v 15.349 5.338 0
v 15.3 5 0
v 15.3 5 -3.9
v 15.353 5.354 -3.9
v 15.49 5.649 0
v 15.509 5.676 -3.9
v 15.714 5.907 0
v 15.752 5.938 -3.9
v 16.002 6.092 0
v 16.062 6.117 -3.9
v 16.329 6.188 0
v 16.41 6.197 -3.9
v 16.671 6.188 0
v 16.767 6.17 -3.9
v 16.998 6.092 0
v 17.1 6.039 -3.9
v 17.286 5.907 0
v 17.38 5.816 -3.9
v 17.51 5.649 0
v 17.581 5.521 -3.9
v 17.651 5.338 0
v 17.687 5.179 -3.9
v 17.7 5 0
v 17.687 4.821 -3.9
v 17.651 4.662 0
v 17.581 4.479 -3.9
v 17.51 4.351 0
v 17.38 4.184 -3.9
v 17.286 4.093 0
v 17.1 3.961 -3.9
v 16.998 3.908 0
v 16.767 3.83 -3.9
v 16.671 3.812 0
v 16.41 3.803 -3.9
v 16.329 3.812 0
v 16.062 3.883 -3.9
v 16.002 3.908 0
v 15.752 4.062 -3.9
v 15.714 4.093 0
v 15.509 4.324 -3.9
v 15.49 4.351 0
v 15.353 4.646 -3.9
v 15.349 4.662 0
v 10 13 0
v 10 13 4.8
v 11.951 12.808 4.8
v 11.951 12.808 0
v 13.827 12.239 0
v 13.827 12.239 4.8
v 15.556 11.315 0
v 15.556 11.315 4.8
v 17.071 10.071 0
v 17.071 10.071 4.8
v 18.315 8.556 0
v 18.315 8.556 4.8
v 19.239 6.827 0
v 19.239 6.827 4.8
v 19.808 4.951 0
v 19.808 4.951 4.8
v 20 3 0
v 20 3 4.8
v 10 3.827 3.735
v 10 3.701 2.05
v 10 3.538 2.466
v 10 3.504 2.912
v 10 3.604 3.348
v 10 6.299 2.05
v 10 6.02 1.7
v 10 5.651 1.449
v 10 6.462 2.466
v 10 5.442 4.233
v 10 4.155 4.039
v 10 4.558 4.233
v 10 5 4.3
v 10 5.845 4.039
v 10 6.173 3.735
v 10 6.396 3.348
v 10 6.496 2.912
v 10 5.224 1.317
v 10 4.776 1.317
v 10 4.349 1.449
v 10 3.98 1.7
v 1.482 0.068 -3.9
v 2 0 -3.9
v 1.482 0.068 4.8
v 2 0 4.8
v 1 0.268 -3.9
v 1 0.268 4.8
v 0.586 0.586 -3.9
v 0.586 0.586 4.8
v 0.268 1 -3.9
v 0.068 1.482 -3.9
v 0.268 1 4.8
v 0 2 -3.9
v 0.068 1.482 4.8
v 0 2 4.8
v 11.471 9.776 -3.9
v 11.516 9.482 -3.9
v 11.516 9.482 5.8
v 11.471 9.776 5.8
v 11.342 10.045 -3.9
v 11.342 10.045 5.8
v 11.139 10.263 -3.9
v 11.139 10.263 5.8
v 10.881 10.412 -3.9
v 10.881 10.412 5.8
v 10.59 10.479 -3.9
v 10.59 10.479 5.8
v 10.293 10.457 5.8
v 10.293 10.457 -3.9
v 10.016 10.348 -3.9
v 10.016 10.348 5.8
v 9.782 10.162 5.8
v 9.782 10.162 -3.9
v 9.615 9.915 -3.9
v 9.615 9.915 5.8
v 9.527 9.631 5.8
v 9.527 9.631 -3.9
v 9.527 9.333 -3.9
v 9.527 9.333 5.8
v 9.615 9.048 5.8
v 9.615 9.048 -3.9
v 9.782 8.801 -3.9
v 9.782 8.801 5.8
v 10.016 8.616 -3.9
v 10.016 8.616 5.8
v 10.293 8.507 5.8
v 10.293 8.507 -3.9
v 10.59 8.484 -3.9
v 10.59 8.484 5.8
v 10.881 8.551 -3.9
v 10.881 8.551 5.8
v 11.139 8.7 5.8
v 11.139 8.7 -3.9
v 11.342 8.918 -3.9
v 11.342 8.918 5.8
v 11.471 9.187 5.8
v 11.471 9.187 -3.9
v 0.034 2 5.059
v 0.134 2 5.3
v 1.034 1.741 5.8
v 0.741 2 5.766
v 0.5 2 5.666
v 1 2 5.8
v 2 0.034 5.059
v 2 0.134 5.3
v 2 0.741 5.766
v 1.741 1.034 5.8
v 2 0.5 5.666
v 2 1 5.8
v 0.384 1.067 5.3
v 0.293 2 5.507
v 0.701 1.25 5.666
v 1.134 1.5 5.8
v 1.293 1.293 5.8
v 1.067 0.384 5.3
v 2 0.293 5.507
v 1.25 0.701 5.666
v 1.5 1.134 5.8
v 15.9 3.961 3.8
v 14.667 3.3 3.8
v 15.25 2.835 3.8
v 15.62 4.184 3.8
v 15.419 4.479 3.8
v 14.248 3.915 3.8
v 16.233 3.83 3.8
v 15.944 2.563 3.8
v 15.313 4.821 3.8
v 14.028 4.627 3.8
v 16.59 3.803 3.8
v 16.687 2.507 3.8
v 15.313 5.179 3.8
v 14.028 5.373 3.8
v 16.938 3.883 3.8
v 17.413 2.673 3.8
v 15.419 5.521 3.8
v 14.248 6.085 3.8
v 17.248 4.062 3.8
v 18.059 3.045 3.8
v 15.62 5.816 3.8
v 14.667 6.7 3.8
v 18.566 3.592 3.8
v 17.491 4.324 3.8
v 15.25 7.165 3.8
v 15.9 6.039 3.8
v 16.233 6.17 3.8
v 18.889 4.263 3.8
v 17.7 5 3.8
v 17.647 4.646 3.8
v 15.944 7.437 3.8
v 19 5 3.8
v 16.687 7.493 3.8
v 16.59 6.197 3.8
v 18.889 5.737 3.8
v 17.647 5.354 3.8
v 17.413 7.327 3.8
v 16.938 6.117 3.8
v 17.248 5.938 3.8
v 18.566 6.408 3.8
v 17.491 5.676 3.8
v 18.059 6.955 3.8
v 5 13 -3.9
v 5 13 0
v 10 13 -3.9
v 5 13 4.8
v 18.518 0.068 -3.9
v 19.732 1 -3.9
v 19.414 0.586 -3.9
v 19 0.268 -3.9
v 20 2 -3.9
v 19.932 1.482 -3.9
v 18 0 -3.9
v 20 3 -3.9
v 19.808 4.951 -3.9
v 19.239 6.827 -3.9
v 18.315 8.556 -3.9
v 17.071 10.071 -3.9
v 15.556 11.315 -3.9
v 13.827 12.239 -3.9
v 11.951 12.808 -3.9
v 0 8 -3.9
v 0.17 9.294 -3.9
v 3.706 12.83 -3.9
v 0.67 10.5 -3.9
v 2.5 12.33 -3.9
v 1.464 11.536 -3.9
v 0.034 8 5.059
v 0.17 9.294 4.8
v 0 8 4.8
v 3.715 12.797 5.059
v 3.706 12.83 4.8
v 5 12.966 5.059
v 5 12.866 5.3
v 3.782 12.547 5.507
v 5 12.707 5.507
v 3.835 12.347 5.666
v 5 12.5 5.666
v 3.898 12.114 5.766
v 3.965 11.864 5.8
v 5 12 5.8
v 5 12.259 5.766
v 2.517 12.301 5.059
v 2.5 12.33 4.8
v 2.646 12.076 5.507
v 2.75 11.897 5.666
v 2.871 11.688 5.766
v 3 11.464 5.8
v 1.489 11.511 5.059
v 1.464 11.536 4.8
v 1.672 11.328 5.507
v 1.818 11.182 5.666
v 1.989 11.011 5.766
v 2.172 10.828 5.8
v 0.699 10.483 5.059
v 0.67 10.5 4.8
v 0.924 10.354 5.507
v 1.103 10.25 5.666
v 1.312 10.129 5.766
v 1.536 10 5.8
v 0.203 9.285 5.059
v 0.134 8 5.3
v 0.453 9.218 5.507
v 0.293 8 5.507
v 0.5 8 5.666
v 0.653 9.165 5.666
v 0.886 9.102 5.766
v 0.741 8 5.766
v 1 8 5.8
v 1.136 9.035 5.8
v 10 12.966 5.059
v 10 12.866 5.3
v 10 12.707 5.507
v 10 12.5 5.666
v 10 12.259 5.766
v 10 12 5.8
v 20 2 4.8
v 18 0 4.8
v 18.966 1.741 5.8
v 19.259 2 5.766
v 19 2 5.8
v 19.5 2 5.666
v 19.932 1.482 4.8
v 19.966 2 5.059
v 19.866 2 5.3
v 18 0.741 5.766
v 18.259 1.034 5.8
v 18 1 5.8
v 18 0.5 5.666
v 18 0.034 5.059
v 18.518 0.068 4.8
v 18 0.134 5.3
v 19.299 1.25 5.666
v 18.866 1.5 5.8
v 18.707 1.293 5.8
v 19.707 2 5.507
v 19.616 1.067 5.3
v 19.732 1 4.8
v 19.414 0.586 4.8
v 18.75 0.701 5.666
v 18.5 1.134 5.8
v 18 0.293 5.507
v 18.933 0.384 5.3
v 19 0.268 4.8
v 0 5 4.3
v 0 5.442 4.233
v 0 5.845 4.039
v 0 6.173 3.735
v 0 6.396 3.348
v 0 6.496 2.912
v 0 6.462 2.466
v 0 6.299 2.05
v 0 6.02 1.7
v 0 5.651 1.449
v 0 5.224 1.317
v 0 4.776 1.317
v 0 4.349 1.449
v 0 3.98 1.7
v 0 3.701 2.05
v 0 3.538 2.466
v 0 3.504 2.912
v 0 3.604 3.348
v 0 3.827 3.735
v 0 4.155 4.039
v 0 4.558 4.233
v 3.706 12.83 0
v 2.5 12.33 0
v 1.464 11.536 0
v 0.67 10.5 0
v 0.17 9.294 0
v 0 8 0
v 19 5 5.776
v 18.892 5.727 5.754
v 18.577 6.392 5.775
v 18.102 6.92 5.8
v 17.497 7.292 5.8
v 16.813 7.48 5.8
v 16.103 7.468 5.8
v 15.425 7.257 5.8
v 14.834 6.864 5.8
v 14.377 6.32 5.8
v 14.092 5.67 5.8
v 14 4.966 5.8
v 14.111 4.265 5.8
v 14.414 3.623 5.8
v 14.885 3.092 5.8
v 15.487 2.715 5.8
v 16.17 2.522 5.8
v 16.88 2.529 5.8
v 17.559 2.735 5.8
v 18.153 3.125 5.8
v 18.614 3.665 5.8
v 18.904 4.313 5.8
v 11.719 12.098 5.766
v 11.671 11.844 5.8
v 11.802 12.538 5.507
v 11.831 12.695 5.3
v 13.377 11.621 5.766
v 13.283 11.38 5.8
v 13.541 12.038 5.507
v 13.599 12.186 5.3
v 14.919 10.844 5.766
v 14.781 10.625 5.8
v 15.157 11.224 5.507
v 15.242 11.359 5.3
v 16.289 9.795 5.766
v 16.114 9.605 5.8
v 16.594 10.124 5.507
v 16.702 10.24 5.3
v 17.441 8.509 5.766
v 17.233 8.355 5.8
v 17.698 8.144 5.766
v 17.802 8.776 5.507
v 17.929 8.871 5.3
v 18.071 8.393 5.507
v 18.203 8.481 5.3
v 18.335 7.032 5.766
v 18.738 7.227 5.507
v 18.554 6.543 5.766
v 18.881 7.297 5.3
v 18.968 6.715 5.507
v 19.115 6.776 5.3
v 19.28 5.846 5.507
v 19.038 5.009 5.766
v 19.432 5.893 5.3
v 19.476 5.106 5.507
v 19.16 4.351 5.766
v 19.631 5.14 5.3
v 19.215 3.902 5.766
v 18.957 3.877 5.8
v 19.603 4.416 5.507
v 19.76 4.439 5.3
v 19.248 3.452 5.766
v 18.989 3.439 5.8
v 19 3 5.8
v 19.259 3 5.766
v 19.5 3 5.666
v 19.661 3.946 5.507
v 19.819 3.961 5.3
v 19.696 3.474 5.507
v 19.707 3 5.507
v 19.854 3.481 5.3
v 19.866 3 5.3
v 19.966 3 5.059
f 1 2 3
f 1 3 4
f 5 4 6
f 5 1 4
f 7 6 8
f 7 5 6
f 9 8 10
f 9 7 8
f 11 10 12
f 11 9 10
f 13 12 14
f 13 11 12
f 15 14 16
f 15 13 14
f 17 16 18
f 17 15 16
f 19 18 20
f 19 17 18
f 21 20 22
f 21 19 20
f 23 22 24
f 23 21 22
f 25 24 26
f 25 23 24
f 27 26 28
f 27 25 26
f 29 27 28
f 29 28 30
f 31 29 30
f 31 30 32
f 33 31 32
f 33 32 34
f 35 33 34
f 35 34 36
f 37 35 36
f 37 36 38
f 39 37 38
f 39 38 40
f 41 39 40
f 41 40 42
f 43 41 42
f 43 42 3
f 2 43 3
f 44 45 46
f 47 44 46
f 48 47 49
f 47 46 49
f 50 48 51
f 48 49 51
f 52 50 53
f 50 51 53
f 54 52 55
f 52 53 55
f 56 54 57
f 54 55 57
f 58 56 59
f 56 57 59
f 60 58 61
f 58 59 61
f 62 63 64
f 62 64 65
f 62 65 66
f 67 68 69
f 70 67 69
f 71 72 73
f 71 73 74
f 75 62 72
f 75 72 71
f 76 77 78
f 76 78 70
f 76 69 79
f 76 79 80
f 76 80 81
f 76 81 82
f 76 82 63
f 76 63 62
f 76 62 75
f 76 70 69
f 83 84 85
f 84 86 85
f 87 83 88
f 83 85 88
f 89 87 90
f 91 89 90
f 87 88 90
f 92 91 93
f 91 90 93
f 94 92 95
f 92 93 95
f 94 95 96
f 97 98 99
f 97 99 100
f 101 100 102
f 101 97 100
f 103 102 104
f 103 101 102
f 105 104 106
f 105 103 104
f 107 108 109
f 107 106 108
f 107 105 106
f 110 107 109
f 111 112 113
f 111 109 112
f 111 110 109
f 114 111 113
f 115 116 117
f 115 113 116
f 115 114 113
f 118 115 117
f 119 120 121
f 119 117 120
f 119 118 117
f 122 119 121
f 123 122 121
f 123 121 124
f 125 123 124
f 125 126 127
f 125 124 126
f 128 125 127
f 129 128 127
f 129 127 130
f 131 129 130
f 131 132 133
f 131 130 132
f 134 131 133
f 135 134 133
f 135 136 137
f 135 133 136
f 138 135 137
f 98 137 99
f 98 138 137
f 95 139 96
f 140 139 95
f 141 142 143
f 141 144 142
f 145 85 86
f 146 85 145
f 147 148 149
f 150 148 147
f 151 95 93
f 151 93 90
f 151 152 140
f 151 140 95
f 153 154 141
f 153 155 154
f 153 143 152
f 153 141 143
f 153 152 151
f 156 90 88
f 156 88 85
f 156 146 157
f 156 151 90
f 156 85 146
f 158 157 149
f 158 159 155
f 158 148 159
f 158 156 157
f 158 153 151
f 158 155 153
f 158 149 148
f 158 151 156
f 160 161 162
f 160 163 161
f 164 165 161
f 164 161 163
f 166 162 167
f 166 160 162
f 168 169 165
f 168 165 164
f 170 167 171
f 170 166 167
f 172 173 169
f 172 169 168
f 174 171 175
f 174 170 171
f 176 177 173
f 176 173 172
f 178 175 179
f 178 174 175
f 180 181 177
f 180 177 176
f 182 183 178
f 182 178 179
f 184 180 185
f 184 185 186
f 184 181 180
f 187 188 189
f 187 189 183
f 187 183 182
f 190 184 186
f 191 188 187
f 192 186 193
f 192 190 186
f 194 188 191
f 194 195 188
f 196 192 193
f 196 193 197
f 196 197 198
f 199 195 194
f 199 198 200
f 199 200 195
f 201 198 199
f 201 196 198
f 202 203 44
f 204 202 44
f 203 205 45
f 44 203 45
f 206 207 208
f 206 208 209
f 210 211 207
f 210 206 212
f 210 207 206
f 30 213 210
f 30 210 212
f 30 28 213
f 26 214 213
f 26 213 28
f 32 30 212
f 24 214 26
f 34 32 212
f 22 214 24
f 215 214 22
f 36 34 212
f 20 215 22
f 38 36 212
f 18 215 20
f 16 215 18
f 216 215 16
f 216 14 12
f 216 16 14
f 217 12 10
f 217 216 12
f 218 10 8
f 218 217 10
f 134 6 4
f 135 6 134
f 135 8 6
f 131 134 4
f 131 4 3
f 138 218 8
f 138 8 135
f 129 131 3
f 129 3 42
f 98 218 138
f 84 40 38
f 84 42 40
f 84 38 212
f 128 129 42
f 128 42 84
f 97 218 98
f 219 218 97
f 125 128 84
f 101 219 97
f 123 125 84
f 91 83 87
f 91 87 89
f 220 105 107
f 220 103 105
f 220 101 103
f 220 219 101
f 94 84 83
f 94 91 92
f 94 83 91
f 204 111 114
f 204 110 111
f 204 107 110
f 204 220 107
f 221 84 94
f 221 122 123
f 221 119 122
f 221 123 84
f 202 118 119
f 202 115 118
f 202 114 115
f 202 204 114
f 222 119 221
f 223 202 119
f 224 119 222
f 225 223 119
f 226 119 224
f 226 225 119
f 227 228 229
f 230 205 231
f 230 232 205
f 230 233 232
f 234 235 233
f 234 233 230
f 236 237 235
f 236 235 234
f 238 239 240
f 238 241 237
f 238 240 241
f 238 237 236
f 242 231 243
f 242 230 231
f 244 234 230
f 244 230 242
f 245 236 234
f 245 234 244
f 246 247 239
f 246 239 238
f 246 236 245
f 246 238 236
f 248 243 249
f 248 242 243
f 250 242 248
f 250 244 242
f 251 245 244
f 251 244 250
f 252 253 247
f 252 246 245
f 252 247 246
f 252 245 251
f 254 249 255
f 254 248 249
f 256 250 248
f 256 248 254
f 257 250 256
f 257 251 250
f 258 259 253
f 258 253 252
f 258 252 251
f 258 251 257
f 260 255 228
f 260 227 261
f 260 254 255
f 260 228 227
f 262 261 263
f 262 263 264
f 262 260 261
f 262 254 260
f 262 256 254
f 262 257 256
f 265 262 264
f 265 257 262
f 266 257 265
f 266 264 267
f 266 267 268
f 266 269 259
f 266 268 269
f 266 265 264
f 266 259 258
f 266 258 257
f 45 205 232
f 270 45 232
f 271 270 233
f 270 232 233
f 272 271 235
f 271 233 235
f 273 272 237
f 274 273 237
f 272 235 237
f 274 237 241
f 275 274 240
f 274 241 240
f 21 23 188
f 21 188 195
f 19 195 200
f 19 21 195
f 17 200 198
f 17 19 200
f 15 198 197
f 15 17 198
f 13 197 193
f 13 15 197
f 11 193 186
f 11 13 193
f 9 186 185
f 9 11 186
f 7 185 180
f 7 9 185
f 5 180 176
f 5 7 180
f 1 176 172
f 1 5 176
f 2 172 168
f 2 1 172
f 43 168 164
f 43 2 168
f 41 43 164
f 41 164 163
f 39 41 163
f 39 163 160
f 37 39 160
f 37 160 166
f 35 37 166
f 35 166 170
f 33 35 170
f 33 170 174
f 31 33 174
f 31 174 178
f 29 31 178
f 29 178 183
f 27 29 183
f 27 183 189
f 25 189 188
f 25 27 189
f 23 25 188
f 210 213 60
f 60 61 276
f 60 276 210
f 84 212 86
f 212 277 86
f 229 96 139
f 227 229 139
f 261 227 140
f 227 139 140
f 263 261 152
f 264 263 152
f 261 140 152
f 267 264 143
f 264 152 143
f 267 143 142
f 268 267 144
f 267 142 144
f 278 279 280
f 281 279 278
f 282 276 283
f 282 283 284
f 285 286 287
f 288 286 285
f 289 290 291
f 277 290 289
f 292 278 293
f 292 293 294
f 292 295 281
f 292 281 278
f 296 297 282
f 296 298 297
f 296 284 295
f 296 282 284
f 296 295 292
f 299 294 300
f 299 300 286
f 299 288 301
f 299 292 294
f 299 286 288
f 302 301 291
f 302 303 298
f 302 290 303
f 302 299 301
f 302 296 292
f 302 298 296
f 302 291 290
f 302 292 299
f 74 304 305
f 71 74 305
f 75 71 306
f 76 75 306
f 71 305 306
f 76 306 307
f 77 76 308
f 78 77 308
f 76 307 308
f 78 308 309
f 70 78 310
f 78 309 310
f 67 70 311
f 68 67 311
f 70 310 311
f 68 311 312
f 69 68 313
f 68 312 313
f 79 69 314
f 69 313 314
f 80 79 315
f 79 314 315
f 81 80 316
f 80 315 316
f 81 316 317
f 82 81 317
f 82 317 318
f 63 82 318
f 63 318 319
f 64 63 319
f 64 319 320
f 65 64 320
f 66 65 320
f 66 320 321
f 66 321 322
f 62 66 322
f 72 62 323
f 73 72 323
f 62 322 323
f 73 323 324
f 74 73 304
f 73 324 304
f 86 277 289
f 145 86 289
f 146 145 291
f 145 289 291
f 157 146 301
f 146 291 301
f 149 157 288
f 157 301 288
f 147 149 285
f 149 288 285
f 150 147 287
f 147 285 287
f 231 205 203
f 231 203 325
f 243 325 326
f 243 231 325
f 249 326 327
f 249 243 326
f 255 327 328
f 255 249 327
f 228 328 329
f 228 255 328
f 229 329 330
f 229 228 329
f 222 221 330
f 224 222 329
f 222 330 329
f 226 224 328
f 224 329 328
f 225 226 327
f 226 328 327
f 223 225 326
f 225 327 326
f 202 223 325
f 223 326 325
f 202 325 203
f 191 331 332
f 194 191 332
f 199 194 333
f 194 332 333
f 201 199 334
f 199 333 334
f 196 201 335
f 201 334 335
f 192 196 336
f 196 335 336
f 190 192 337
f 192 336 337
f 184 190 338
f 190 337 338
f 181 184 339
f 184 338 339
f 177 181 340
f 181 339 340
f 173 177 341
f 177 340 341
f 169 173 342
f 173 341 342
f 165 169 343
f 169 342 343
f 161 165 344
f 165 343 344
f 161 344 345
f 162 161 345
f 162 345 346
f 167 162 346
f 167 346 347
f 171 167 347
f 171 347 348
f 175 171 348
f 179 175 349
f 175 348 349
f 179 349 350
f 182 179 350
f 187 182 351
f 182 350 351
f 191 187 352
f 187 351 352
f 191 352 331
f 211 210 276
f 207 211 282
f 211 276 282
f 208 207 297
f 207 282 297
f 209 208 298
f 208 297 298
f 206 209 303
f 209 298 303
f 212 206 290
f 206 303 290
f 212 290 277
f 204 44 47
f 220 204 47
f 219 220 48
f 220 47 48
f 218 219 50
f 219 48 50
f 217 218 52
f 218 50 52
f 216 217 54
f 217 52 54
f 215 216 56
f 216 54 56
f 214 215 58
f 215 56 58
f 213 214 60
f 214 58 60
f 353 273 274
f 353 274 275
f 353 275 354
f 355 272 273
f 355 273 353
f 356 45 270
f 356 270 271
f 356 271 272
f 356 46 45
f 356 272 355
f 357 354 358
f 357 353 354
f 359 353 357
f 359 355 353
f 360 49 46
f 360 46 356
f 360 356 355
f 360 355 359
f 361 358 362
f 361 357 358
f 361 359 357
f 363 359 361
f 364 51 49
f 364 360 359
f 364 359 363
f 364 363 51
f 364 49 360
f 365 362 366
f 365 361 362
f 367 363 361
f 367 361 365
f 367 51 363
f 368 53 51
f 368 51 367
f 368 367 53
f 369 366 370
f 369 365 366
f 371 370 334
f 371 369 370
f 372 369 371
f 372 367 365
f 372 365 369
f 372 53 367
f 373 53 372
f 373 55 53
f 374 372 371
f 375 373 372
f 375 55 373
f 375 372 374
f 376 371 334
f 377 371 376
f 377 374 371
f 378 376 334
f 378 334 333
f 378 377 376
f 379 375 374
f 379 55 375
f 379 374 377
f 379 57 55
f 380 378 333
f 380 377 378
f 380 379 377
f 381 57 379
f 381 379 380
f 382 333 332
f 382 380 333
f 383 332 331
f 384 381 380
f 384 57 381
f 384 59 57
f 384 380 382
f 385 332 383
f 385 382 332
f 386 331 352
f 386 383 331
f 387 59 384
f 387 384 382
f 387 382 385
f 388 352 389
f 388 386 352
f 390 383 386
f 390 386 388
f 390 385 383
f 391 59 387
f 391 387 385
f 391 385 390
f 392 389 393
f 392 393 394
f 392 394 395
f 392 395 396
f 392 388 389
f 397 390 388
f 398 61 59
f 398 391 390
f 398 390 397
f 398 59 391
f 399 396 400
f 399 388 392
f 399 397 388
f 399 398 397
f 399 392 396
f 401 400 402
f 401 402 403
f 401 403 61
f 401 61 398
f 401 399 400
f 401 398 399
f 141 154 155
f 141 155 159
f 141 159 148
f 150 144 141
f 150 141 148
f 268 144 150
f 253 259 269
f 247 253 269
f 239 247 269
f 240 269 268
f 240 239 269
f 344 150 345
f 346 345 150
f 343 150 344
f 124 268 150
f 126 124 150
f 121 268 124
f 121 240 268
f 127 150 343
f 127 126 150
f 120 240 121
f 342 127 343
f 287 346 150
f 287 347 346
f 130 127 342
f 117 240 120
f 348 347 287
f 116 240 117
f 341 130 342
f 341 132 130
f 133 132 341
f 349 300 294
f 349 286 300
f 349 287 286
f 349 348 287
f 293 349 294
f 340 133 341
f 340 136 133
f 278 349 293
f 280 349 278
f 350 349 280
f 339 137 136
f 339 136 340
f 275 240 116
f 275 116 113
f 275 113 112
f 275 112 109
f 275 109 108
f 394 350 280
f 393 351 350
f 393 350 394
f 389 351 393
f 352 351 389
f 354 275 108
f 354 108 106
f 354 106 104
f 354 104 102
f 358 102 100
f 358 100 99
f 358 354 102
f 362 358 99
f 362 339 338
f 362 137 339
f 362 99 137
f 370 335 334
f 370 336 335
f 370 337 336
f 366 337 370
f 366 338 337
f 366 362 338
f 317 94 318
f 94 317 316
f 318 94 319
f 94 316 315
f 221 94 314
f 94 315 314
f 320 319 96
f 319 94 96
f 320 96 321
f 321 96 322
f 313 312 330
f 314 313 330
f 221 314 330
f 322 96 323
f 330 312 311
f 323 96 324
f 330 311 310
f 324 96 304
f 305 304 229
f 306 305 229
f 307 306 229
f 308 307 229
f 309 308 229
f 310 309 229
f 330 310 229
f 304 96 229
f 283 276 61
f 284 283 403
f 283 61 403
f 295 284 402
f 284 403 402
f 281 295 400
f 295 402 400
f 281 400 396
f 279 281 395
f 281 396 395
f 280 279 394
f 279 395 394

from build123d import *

# Parameters (mm, degrees)
SKETCH1_W               = 20
SKETCH1_H               = 13
SKETCH1_R               = 1.2
BOSS_EXTRUDE1_DEPTH     = 5.8
SKETCH2_R               = 2.5
CUT_EXTRUDE1_DEPTH      = 2
SKETCH3_R               = 1.5
CUT_EXTRUDE2_DEPTH      = 10
FILLET1_R               = 10
FILLET2_R               = 5
FILLET3_R               = 2
FILLET4_R               = 1
SKETCH5_R               = 1.2
BOSS_EXTRUDE2_DEPTH     = 3.9
CUT_EXTRUDE3_DEPTH      = 26.750534103
CUT_EXTRUDE3_DEPTH_BACK = 26.750534103
SKETCH6_R               = 1


with BuildPart() as part:
    # Sketch1 → Boss-Extrude1 (new body)
    with BuildSketch(Plane.XY):
        with Locations((10, 6.5)):
            Rectangle(SKETCH1_W, SKETCH1_H)
        with Locations((16.5, 5)):
            Circle(SKETCH1_R, mode=Mode.SUBTRACT)
    extrude(amount=BOSS_EXTRUDE1_DEPTH)

    # Sketch2 → Cut-Extrude1 (cut)
    with BuildSketch(Plane.XY.offset(5.8)):
        with Locations((16.5, 5)):
            Circle(SKETCH2_R)
    extrude(amount=-CUT_EXTRUDE1_DEPTH, mode=Mode.SUBTRACT)

    # Sketch3 → Cut-Extrude2 (cut)
    with BuildSketch(Plane.ZY):
        with Locations((2.8, 5)):
            Circle(SKETCH3_R)
    extrude(amount=-CUT_EXTRUDE2_DEPTH, mode=Mode.SUBTRACT)

    # Fillet1
    fillet1_edges = [part.edges().sort_by_distance(p)[0] for p in [
        (20, 13, 2.9),
    ]]
    fillet(fillet1_edges, radius=FILLET1_R)

    # Fillet2
    fillet2_edges = [part.edges().sort_by_distance(p)[0] for p in [
        (0, 13, 2.9),
    ]]
    fillet(fillet2_edges, radius=FILLET2_R)

    # Fillet3
    fillet3_edges = [part.edges().sort_by_distance(p)[0] for p in [
        (0, 0, 2.9),
        (20, 0, 2.9),
    ]]
    fillet(fillet3_edges, radius=FILLET3_R)

    # Fillet4
    # the kernel refuses this fillet: 1 mm, written as the material it takes off along each edge
    with BuildSketch(Plane(origin=(5, 13, 5.8), x_dir=(0, 0, -1), z_dir=(1, 0, 0))) as fillet4_piece_1:
        with BuildLine():
            CenterArc((FILLET4_R, -FILLET4_R), FILLET4_R, 90, 90)
            Line((0, -FILLET4_R), (0, 0))
            Line((0, 0), (FILLET4_R, 0))
        make_face()
    extrude(amount=5, mode=Mode.SUBTRACT)
    with BuildSketch(Plane(origin=(10, 3, 5.8), x_dir=(0, 1, 0), z_dir=(-1, 0, 0))) as fillet4_piece_2:
        with BuildLine():
            CenterArc((10 - FILLET4_R, FILLET4_R), FILLET4_R, 270, 90)
            Line((10 - FILLET4_R, 0), (10, 0))
            Line((10, 0), (10, FILLET4_R))
        make_face()
    revolve(axis=Axis((10, 3, 5.8), (0, 0, -1)), revolution_arc=90, mode=Mode.SUBTRACT)
    with BuildSketch(Plane(origin=(0, 2, 5.8), x_dir=(0, 0, -1), z_dir=(0, 1, 0))) as fillet4_piece_3:
        with BuildLine():
            CenterArc((FILLET4_R, -FILLET4_R), FILLET4_R, 90, 90)
            Line((0, -FILLET4_R), (0, 0))
            Line((0, 0), (FILLET4_R, 0))
        make_face()
    extrude(amount=6, mode=Mode.SUBTRACT)
    with BuildSketch(Plane(origin=(5, 8, 5.8), x_dir=(0, 1, 0), z_dir=(1, 0, 0))) as fillet4_piece_4:
        with BuildLine():
            CenterArc((5 - FILLET4_R, -FILLET4_R), FILLET4_R, 0, 90)
            Line((5 - FILLET4_R, 0), (5, 0))
            Line((5, 0), (5, -FILLET4_R))
        make_face()
    revolve(axis=Axis((5, 8, 5.8), (0, 0, 1)), revolution_arc=90, mode=Mode.SUBTRACT)
    with BuildSketch(Plane(origin=(20, 3, 5.8), x_dir=(0, 0, -1), z_dir=(0, -1, 0))) as fillet4_piece_5:
        with BuildLine():
            CenterArc((FILLET4_R, -FILLET4_R), FILLET4_R, 90, 90)
            Line((0, -FILLET4_R), (0, 0))
            Line((0, 0), (FILLET4_R, 0))
        make_face()
    extrude(amount=1, mode=Mode.SUBTRACT)
    with BuildSketch(Plane(origin=(18, 0, 5.8), x_dir=(0, 0, -1), z_dir=(-1, 0, 0))) as fillet4_piece_6:
        with BuildLine():
            CenterArc((FILLET4_R, -FILLET4_R), FILLET4_R, 90, 90)
            Line((0, -FILLET4_R), (0, 0))
            Line((0, 0), (FILLET4_R, 0))
        make_face()
    extrude(amount=16, mode=Mode.SUBTRACT)
    with BuildSketch(Plane(origin=(2, 2, 5.8), x_dir=(-1, 0, 0), z_dir=(0, 1, 0))) as fillet4_piece_7:
        with BuildLine():
            CenterArc((2 - FILLET4_R, -FILLET4_R), FILLET4_R, 0, 90)
            Line((2 - FILLET4_R, 0), (2, 0))
            Line((2, 0), (2, -FILLET4_R))
        make_face()
    revolve(axis=Axis((2, 2, 5.8), (0, 0, 1)), revolution_arc=90, mode=Mode.SUBTRACT)
    with BuildSketch(Plane(origin=(18, 2, 5.8), x_dir=(1, 0, 0), z_dir=(0, 1, 0))) as fillet4_piece_8:
        with BuildLine():
            CenterArc((2 - FILLET4_R, FILLET4_R), FILLET4_R, 270, 90)
            Line((2 - FILLET4_R, 0), (2, 0))
            Line((2, 0), (2, FILLET4_R))
        make_face()
    revolve(axis=Axis((18, 2, 5.8), (0, 0, -1)), revolution_arc=90, mode=Mode.SUBTRACT)

    # Sketch5 → Boss-Extrude2 (add)
    with BuildSketch(Plane(origin=(0, 0, 0), x_dir=(-1, 0, 0), z_dir=(0, 0, -1))):
        with BuildLine():
            Line((-20, 3), (-20, 2))
            ThreePointArc((-20, 2), (-19.414213562, 0.585786438), (-18, 0))
            Line((-18, 0), (-2, 0))
            ThreePointArc((-2, 0), (-0.585786438, 0.585786438), (0, 2))
            Line((0, 2), (0, 8))
            ThreePointArc((0, 8), (-1.464466094, 11.535533906), (-5, 13))
            Line((-5, 13), (-10, 13))
            ThreePointArc((-10, 13), (-17.071067812, 10.071067812), (-20, 3))
        make_face()
        with Locations((-16.5, 5)):
            Circle(SKETCH5_R, mode=Mode.SUBTRACT)
    extrude(amount=BOSS_EXTRUDE2_DEPTH)

    # Sketch6 → Cut-Extrude3 (cut, two sides: drawn at the far end of the back side and taken through both)
    with BuildSketch(Plane.XY.offset(5.8).offset(-CUT_EXTRUDE3_DEPTH_BACK)):
        with Locations((10.515506471, 9.481609927)):
            Circle(SKETCH6_R)
    extrude(amount=CUT_EXTRUDE3_DEPTH + CUT_EXTRUDE3_DEPTH_BACK, mode=Mode.SUBTRACT)


solid = part.part
